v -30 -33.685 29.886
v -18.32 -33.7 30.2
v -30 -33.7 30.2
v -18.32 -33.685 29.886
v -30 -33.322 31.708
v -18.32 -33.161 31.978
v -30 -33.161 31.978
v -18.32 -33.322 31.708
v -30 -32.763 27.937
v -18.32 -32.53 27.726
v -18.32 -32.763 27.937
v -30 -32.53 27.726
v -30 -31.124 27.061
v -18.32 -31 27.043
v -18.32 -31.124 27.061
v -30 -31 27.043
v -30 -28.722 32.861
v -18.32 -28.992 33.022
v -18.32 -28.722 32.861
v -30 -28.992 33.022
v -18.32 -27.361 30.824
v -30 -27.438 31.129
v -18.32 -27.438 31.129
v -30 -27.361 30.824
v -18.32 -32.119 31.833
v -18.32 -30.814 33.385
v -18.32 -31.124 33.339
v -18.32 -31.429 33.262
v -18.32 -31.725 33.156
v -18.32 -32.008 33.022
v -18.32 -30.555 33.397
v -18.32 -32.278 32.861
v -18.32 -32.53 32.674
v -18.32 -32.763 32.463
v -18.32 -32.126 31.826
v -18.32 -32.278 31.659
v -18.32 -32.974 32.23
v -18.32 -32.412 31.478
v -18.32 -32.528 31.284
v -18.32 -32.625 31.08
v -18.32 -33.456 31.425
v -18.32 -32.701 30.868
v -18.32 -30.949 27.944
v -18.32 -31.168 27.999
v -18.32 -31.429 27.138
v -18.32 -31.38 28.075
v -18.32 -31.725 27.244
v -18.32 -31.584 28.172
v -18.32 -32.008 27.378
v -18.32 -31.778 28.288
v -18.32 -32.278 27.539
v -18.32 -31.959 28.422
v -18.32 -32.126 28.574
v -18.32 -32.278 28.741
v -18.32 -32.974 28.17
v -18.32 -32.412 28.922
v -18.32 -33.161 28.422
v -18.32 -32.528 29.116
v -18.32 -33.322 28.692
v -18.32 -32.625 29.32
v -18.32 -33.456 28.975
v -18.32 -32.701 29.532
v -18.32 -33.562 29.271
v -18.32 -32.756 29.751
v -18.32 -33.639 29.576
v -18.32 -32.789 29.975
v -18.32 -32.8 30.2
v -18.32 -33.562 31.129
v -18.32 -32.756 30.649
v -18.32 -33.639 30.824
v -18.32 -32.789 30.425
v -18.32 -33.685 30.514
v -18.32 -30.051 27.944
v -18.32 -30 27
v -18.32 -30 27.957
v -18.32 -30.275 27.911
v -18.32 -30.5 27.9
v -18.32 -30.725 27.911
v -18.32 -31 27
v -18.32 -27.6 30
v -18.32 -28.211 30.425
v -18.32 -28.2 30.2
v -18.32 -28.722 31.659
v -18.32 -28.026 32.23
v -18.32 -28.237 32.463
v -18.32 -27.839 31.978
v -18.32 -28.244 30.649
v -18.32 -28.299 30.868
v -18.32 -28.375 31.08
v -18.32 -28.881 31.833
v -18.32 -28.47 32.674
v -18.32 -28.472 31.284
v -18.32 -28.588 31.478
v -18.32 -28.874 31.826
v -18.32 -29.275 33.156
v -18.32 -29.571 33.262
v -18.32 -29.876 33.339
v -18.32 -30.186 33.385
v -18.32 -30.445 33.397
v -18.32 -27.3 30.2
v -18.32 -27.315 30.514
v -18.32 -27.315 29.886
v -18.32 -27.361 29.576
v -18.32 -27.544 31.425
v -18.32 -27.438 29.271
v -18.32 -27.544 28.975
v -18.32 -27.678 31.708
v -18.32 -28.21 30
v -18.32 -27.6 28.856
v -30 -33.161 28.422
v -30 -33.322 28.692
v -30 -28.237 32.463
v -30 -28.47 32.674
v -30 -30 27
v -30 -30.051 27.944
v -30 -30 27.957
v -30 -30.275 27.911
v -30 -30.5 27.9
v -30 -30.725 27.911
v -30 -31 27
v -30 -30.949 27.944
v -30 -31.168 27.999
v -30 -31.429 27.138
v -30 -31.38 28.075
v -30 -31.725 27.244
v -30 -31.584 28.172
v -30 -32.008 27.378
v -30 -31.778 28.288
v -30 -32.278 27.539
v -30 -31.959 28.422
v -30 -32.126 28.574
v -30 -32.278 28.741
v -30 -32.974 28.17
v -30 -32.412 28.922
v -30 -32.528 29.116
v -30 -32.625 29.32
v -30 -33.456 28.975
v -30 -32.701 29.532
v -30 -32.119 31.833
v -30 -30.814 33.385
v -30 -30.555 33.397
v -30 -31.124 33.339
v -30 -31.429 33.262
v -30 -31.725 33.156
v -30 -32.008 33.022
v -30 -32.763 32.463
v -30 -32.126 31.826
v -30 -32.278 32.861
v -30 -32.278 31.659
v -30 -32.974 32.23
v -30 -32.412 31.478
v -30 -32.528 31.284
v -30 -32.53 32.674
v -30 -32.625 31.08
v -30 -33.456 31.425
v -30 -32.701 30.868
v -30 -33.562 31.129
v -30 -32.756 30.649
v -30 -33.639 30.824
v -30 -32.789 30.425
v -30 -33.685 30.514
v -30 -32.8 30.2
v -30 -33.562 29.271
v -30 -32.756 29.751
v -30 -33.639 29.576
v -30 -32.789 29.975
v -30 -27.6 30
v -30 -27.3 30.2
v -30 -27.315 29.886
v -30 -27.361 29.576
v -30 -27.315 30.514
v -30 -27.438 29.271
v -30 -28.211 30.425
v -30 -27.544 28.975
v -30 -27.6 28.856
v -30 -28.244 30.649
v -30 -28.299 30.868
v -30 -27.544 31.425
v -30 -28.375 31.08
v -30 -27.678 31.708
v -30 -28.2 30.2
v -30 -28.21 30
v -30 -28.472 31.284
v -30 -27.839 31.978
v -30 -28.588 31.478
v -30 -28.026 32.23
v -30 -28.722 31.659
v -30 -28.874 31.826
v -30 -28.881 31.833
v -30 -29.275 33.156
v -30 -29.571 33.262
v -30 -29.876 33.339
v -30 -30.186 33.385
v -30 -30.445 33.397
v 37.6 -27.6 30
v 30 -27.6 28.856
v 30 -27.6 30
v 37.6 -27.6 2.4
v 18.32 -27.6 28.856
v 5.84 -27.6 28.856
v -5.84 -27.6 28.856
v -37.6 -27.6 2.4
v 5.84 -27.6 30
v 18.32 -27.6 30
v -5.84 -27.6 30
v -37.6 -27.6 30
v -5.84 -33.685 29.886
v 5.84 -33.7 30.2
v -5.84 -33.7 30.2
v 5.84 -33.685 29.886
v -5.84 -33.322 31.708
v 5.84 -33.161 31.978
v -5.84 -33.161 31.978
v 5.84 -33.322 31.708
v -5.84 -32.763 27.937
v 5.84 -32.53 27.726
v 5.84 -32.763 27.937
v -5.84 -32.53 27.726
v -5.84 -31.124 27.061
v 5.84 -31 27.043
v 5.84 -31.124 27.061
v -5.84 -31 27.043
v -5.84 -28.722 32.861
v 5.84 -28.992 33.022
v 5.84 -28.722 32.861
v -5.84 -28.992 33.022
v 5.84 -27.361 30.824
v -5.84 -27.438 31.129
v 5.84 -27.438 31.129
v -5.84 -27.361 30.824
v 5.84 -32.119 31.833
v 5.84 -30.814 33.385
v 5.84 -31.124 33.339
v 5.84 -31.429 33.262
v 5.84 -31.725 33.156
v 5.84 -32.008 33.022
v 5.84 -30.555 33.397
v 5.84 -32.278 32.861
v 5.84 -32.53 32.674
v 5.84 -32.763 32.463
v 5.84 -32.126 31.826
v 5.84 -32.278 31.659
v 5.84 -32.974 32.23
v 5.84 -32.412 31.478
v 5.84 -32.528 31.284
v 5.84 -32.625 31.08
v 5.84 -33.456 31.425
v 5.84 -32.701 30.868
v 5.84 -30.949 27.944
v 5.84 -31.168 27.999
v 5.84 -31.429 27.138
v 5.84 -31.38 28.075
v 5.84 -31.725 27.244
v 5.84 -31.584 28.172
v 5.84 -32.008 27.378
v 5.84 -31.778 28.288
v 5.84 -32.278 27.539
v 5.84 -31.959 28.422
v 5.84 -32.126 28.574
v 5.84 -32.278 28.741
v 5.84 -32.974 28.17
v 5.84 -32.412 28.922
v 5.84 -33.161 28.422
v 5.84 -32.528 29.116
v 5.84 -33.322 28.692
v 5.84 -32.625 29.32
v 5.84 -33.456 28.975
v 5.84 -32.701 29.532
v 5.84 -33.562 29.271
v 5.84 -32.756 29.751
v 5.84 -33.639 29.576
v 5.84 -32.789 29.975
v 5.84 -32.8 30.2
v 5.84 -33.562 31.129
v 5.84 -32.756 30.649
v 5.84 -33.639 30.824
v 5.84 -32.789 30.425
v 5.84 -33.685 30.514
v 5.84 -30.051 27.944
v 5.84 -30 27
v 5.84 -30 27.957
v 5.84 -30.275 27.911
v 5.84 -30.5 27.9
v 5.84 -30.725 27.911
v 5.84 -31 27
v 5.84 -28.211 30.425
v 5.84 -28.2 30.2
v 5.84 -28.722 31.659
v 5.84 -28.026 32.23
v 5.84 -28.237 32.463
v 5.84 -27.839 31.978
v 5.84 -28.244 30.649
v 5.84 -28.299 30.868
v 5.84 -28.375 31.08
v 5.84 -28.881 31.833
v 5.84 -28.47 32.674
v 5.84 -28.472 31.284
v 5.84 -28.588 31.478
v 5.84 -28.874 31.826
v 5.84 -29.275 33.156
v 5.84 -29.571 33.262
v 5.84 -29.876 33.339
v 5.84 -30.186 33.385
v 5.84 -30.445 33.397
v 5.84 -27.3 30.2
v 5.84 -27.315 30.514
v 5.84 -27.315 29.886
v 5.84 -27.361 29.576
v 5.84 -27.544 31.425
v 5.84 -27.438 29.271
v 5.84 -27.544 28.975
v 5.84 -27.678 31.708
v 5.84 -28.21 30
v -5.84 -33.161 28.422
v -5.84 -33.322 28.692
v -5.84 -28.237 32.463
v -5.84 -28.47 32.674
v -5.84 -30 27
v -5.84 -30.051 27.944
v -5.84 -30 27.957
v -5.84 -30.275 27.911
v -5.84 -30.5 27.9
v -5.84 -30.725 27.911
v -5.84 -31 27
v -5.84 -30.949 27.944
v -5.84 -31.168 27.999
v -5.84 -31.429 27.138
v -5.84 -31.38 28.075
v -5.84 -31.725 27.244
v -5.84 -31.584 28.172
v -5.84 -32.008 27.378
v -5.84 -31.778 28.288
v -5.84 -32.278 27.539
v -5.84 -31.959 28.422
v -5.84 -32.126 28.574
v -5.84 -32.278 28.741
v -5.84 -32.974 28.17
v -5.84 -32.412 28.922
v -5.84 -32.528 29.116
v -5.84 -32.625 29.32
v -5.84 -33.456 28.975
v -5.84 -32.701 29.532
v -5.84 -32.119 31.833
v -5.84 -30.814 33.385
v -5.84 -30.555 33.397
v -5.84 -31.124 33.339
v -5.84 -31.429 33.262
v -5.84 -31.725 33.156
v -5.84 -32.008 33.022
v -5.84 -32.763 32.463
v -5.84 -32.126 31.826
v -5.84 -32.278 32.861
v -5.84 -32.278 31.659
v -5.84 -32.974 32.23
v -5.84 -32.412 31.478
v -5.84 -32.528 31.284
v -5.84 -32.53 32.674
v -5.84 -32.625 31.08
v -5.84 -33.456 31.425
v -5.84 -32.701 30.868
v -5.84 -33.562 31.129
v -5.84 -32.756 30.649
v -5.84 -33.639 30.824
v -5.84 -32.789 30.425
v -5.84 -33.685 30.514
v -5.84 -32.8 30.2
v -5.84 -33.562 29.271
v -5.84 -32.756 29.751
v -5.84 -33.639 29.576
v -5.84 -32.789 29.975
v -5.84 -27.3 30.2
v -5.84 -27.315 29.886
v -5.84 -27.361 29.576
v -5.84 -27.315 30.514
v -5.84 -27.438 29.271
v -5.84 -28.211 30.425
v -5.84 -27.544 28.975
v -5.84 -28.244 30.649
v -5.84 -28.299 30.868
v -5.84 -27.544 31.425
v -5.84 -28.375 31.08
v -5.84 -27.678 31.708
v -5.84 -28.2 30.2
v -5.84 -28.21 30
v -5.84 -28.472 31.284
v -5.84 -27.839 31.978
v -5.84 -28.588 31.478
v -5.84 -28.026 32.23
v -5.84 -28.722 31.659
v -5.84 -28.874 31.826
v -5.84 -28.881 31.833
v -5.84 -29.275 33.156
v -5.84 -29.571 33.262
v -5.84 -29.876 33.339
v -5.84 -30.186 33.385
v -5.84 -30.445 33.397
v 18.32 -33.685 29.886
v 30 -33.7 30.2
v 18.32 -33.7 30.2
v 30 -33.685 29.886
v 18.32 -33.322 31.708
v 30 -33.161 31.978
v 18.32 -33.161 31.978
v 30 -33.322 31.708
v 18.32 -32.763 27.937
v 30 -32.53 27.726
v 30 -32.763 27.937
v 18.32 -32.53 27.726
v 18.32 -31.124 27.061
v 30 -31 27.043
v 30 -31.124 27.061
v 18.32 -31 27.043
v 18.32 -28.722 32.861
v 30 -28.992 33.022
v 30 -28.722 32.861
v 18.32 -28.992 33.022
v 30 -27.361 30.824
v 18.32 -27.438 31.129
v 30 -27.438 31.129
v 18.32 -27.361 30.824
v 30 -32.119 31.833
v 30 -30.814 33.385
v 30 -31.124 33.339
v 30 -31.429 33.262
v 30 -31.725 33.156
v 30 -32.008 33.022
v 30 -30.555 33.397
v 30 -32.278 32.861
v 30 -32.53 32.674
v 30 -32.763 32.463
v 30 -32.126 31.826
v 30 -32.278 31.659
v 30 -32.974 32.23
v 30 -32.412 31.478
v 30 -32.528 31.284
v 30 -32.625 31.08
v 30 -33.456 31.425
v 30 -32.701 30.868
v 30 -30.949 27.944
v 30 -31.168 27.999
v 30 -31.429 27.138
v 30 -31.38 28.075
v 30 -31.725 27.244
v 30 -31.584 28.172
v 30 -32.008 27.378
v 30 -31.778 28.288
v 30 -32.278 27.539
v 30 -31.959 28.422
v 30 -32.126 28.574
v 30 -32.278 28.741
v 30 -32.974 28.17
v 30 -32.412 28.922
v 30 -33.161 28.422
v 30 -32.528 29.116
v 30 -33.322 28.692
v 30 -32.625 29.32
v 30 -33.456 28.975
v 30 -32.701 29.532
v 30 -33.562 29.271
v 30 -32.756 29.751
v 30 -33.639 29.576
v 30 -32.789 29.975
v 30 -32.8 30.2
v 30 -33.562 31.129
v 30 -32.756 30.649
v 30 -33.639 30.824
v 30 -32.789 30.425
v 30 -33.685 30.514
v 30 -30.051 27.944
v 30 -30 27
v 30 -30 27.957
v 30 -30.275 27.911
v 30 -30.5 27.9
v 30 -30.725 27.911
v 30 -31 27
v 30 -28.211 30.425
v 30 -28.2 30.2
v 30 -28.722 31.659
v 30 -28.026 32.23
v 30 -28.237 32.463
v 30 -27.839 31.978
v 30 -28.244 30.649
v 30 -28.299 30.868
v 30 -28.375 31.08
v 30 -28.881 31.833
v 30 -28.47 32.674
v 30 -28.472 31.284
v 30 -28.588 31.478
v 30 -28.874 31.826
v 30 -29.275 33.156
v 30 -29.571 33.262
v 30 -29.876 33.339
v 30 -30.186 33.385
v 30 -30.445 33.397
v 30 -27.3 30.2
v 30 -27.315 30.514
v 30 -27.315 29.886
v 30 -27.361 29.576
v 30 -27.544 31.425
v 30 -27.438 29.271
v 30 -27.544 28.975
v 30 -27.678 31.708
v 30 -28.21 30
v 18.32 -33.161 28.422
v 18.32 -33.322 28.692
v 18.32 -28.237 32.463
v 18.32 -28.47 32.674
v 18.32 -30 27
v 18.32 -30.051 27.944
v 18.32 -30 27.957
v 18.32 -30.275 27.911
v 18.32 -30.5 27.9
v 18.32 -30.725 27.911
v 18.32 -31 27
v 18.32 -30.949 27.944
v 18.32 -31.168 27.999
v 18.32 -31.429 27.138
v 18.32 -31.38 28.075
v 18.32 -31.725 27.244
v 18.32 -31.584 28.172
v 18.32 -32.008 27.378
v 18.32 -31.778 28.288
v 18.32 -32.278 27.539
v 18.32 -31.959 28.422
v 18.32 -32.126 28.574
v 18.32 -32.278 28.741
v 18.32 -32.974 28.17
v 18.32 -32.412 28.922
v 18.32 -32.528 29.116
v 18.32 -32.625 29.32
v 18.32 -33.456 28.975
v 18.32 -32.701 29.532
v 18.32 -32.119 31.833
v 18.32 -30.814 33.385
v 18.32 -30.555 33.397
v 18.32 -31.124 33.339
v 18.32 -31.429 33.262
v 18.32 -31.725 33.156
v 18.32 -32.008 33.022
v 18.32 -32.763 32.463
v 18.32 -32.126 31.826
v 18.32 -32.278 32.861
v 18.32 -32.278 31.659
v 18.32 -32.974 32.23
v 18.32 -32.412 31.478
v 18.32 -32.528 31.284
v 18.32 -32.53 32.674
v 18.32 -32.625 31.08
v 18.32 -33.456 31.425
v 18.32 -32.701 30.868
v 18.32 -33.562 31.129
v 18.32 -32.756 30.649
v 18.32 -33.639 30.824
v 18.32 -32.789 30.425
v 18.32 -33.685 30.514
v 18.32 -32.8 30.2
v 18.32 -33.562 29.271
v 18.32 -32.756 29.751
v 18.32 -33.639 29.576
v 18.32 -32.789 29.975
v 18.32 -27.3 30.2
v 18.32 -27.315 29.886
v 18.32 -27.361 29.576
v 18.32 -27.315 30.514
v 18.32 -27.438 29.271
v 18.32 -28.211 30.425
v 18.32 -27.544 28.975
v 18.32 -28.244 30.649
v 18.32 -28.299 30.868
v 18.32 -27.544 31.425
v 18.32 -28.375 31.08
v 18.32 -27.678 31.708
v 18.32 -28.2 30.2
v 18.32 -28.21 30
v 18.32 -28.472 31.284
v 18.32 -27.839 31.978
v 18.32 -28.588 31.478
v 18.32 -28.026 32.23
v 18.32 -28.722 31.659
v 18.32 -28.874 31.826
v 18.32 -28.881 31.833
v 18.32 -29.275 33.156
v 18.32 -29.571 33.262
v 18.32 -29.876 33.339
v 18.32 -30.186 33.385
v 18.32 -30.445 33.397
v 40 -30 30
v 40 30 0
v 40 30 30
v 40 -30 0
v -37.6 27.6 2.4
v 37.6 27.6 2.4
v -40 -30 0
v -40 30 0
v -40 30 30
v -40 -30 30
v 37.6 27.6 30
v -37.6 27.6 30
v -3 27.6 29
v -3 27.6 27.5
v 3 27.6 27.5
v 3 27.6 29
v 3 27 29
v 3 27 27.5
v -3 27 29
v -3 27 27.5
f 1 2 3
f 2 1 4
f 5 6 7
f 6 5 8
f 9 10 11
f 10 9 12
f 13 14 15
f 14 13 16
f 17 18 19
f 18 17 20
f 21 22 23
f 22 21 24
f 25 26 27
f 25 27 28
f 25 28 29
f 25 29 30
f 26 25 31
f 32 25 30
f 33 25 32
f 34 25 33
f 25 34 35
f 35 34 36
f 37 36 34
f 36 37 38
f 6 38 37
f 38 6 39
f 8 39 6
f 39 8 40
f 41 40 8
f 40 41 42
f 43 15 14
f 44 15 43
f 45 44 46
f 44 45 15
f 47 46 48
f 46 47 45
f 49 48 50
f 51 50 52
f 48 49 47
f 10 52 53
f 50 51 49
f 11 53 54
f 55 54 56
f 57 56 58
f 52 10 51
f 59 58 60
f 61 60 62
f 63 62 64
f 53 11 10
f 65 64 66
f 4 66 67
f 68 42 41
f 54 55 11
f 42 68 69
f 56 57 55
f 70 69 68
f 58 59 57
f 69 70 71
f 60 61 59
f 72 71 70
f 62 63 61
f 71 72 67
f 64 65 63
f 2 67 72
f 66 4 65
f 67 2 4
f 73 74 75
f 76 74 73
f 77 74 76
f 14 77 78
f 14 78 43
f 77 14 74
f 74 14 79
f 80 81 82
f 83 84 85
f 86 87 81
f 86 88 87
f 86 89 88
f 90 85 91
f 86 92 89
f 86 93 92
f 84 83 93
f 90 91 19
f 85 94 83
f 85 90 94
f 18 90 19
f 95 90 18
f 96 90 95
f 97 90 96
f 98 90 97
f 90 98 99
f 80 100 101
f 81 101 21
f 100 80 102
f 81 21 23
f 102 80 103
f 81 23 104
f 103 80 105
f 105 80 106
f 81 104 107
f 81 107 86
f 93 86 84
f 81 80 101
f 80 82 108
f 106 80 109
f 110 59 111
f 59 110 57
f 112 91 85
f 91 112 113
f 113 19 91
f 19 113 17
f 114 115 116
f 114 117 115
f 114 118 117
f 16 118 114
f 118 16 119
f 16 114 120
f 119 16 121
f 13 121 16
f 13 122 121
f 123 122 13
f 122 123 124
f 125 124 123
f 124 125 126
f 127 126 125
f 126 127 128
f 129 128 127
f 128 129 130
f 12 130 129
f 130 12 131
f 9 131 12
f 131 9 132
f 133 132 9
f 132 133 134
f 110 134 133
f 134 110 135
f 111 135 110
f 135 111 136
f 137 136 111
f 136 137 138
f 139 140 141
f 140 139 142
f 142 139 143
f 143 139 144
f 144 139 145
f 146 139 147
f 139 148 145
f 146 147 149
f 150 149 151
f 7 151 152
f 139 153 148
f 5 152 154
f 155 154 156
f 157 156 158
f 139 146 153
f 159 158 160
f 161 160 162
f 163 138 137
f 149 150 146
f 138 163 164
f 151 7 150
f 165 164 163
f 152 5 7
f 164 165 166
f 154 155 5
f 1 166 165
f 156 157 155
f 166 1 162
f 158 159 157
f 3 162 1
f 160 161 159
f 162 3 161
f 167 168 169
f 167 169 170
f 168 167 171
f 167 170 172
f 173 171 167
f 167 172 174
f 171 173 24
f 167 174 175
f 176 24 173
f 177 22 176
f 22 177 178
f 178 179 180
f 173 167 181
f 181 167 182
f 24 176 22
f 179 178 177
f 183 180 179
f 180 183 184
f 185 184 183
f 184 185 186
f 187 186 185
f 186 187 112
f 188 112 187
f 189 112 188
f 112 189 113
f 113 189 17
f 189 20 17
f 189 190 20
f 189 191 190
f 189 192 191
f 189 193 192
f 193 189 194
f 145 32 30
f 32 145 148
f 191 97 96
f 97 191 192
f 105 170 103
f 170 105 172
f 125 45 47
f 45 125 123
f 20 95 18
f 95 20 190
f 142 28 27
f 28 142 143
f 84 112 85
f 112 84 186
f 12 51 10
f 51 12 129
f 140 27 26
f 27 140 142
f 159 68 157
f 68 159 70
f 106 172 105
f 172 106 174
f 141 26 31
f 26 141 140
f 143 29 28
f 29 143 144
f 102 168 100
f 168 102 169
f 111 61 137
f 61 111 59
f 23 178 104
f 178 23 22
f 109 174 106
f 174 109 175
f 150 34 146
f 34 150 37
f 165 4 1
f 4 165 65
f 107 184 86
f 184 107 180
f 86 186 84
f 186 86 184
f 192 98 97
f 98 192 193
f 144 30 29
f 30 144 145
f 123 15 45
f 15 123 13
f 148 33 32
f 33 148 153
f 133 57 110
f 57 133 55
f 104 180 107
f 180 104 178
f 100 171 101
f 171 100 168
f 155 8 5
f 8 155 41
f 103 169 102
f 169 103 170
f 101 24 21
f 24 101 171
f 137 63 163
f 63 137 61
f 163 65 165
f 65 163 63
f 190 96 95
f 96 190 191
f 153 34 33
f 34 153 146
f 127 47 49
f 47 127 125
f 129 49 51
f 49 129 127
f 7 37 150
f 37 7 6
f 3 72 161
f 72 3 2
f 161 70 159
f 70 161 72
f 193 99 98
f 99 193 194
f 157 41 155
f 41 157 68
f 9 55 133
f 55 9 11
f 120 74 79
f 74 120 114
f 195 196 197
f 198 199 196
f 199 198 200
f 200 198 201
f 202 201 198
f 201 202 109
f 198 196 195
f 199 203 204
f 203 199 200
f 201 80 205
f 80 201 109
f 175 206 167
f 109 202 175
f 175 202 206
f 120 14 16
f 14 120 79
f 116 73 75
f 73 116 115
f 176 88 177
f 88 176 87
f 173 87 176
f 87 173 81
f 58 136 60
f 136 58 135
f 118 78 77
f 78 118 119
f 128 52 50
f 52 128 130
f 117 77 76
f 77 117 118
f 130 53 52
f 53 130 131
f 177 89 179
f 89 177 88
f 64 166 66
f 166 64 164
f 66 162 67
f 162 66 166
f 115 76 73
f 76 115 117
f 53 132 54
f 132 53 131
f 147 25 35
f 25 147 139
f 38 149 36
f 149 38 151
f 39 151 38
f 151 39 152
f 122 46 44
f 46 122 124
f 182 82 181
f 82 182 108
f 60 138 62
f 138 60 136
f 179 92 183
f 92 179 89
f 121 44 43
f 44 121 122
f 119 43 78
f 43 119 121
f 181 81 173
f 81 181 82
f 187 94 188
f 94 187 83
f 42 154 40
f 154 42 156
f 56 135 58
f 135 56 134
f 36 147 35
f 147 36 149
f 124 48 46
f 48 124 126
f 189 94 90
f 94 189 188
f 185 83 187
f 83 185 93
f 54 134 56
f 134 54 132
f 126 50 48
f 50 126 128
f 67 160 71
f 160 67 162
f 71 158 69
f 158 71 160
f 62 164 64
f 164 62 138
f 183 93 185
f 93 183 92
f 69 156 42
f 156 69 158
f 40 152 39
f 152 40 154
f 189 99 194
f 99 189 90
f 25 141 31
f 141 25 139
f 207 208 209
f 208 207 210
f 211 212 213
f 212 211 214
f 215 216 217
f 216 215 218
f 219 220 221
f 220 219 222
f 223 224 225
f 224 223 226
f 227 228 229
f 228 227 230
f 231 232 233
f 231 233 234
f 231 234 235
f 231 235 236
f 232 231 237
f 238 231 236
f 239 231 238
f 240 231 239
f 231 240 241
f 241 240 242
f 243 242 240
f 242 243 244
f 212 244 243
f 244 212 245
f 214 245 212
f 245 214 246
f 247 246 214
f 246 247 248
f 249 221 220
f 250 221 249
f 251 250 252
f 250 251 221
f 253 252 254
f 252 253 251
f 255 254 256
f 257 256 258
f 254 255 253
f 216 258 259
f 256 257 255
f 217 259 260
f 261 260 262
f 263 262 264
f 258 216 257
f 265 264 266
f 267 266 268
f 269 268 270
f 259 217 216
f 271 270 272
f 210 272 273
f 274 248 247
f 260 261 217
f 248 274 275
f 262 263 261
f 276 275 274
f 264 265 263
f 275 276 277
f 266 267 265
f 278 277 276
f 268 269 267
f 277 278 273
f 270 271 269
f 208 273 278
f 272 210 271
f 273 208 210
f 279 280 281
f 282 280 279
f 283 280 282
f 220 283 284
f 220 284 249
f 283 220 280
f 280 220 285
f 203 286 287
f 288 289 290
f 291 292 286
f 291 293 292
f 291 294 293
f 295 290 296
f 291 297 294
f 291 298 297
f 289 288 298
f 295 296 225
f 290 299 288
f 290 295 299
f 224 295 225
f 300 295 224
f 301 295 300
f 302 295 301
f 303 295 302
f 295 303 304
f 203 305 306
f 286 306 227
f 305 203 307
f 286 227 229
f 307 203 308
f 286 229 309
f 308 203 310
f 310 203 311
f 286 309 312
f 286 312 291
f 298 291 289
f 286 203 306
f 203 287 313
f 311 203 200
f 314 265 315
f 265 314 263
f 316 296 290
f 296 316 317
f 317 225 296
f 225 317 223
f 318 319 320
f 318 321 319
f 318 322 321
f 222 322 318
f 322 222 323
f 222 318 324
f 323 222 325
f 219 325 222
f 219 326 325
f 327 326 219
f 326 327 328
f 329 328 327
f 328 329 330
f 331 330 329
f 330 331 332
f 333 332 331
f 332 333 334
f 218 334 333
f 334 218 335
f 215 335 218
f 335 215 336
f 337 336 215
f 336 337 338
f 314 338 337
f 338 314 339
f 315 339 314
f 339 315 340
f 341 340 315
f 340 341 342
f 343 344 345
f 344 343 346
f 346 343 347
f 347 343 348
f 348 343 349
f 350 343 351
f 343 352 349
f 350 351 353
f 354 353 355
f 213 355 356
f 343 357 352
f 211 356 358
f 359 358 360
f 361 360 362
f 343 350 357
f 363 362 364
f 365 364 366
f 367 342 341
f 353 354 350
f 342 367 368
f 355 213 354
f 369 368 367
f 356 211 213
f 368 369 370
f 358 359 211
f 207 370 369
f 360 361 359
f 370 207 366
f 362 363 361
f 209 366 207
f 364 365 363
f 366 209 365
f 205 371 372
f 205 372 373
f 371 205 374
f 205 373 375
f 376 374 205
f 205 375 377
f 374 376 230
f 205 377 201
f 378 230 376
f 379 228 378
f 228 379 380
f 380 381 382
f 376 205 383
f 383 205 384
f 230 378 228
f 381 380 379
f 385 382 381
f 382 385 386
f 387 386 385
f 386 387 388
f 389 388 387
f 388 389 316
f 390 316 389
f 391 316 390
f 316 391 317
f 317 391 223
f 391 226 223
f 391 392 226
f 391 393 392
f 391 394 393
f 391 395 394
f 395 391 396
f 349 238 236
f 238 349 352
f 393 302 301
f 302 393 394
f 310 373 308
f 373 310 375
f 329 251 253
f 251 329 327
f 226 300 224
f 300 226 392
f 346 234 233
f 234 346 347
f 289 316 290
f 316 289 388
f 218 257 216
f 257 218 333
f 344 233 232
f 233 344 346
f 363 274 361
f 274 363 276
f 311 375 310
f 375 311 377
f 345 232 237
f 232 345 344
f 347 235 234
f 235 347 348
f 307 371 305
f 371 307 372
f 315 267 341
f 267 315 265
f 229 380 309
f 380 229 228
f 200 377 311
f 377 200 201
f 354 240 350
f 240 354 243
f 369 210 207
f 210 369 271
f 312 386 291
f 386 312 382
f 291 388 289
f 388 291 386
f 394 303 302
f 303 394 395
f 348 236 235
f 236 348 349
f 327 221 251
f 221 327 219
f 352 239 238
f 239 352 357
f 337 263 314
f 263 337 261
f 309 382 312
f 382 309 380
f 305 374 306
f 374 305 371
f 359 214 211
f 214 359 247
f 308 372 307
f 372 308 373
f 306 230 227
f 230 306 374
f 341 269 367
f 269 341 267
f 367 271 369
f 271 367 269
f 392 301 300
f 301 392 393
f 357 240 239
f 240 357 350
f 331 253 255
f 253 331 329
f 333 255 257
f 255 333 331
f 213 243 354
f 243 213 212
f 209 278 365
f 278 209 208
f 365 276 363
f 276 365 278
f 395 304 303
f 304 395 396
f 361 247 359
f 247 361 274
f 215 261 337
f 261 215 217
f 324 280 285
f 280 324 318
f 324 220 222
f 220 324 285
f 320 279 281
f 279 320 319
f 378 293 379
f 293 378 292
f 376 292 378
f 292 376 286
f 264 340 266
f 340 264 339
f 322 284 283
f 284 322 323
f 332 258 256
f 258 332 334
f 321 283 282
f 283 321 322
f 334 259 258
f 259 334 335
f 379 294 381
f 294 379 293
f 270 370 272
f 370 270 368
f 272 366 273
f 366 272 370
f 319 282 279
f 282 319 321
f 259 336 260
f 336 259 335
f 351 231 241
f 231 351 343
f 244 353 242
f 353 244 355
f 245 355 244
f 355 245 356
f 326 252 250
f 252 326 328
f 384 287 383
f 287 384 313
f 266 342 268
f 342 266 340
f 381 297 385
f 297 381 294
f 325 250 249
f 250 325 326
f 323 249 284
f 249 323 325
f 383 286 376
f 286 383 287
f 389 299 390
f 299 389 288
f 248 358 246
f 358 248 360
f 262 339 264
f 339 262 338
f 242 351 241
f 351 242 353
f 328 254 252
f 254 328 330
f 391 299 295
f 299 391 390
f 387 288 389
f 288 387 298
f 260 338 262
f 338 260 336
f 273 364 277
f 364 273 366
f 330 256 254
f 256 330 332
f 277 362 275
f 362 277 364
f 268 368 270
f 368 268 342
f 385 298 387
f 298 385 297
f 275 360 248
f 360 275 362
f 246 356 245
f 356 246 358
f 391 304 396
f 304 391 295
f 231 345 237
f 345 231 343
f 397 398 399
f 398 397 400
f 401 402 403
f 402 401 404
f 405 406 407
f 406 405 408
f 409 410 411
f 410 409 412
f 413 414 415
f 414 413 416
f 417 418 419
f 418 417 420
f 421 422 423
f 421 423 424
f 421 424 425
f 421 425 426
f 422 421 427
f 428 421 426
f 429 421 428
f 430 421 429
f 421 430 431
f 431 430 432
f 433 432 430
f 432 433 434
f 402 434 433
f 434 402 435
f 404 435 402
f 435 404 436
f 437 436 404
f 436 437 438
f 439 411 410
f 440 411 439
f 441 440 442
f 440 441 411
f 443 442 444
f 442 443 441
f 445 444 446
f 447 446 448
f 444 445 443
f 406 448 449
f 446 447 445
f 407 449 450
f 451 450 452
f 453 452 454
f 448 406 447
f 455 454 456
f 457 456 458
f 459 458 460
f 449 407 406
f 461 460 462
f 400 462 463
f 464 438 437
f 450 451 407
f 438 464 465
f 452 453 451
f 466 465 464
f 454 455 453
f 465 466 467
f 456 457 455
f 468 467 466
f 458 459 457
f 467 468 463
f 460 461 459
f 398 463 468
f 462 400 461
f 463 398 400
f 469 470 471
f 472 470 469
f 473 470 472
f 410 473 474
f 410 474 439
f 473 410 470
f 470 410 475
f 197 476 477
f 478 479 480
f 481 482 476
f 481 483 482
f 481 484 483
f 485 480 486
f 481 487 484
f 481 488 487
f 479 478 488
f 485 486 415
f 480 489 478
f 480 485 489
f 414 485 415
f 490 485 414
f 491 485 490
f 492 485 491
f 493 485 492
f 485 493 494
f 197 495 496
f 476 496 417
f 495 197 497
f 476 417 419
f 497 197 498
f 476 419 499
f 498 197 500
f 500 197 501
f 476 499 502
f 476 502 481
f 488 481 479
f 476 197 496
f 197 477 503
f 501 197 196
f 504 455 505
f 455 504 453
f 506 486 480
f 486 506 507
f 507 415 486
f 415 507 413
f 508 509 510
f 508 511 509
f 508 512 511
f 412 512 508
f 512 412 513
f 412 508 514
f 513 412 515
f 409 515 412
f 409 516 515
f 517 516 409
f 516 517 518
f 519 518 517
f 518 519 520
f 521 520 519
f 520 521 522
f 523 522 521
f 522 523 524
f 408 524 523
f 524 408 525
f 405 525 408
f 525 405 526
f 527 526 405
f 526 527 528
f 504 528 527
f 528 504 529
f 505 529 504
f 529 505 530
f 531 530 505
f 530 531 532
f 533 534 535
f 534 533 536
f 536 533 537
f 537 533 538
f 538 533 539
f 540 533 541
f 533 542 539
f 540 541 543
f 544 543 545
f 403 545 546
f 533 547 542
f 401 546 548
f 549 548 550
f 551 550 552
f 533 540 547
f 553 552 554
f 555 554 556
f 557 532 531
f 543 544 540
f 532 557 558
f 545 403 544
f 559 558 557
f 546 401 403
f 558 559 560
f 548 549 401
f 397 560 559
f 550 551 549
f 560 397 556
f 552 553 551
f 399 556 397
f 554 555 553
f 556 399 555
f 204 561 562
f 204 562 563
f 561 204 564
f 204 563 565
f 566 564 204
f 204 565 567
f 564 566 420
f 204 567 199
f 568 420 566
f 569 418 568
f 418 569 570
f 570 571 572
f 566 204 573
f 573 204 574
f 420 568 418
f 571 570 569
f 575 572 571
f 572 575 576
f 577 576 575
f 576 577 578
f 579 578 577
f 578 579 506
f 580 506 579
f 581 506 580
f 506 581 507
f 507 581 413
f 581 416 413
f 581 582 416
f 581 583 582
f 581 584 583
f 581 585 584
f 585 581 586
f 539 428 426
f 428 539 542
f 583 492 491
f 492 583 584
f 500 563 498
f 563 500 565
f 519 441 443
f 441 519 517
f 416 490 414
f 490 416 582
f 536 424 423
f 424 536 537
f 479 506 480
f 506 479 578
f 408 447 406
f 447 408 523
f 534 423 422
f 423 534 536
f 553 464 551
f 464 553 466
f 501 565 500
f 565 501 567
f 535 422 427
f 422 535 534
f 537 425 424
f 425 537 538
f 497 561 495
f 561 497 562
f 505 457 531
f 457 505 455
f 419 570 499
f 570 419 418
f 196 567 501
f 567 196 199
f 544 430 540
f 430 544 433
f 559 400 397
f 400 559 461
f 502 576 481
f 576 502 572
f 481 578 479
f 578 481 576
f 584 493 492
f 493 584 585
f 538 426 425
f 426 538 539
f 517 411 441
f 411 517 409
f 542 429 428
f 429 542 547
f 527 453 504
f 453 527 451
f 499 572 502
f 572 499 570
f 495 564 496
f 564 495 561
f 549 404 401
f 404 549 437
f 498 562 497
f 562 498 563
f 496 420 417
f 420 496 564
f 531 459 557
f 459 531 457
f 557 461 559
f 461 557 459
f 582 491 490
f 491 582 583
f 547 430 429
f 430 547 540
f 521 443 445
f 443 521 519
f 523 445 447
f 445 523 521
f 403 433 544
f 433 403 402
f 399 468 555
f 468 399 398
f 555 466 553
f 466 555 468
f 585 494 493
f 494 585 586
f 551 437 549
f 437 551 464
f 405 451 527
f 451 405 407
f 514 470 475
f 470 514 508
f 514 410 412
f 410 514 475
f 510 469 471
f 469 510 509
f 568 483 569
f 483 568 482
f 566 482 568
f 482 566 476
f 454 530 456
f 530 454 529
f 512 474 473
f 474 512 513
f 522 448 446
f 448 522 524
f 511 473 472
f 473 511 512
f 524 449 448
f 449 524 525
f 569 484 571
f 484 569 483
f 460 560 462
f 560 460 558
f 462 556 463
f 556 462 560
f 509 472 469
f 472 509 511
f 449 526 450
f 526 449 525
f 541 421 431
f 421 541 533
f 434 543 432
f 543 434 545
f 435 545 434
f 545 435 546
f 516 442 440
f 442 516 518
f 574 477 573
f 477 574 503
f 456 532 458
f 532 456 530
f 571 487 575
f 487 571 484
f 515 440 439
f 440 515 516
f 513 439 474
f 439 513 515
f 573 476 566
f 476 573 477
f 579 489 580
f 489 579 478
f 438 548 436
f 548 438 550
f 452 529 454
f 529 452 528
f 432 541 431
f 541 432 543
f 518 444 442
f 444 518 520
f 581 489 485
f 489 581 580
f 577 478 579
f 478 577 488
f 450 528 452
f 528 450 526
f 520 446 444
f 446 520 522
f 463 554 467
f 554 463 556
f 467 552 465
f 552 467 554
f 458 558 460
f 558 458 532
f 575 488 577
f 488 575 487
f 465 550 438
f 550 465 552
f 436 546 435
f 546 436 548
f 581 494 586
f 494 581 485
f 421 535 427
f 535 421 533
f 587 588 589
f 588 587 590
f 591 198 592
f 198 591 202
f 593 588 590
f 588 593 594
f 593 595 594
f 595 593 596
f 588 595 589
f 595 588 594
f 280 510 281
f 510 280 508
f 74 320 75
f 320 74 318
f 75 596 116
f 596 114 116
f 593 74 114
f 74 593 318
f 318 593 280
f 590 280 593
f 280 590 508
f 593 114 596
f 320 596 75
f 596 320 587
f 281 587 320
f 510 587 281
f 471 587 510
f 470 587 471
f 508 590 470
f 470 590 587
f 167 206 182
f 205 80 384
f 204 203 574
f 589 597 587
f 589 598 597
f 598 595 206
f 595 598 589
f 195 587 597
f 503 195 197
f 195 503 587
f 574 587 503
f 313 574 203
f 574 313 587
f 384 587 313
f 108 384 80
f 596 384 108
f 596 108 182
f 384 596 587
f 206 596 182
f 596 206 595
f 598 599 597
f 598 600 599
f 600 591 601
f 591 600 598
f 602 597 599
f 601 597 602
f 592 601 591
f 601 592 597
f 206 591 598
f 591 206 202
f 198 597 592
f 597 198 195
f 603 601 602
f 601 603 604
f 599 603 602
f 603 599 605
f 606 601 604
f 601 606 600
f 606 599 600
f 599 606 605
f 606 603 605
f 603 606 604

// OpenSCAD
// Box with print-in-place hinge
// [box, lid, pin, assembly]
part = "box";
cadverify_only = "";
module instance(name, part, unit = 1) {
    echo(cadverify_instance = [name, part, unit]);
    if (cadverify_only == "" || cadverify_only == name) children();
}

// Parameters (mm)
W = 80; D = 60; Hbox = 30; Hlid = 10;
t_wall = 2.4; t_floor = 2.4; t_top = 2.4;
gap_v = 0.4;              // vertical lid/box gap
clr_r = 0.3;              // radial pin/bore clearance
clr_a = 0.4;              // axial knuckle gap
Rkn = 3.2; rbore = 2.3; rpin = 2.0;
yh = -30.5;               // hinge axis Y (assembly coords, box centered X0 Y0)
zh_box = 30.2;            // hinge axis Z in box coords (= assembly)
lip_h = 3.0;              // plug depth below lid skirt bottom
plug_t = 2.0;             // plug wall thickness
// hinge segmentation: span -30..30, 5 knuckles len 11.68 gaps 0.4
k_len = 11.68;
k0x0=-30; k0x1=-18.32;
k1x0=-17.92; k1x1=-6.24;
k2x0=-5.84; k2x1=5.84;
k3x0=6.24; k3x1=17.92;
k4x0=18.32; k4x1=30;
// lid part coords: plug bottom Z0, skirt bottom Z3, top Z13
lid_zh = 2.8;             // hinge axis Z in lid part coords (30.2-27.4)
lid_lift = 27.4;          // translate lid part to assembly
pin_lift_z = 27.2; pin_shift_y = -30.5;

$fn = 64;

module teardrop_prism(x0,x1,yh,zh) {
    ya = yh-1.626; za = zh+1.626;
    yb = yh+1.626; zb = zh+1.626;
    yc = yh;       zc = zh+3.252;
    polyhedron(
        points=[[x0,ya,za],[x0,yb,zb],[x0,yc,zc],
                [x1,ya,za],[x1,yb,zb],[x1,yc,zc]],
        faces=[[0,2,1],[3,4,5],[0,1,4,3],[1,2,5,4],[0,3,5,2]]
    );
}

module knuckle_solid(x0,x1,yh,zh) {
    // outer cylinder along X
    translate([x0,yh,zh]) rotate([0,90,0]) cylinder(r=Rkn, h=x1-x0);
}

module knuckle_bore(x0,x1,yh,zh) {
    translate([x0-0.02,yh,zh]) rotate([0,90,0]) cylinder(r=rbore, h=(x1-x0)+0.04);
    teardrop_prism(x0-0.02,x1+0.02,yh,zh);
}

module box_knuckle(x0,x1) {
    difference() {
        union() {
            knuckle_solid(x0,x1,yh,zh_box);
            // lug to back wall: X x0..x1, Y -31..-27.6, Z 27..30.5
            translate([x0,-31,27]) cube([x1-x0, 3.4, 3.5]);
        }
        knuckle_bore(x0,x1,yh,zh_box);
    }
}

module lid_knuckle(x0,x1) {
    difference() {
        union() {
            knuckle_solid(x0,x1,yh,lid_zh);
            // lug to lid back: Y -31..-27.6, Z 1.5..4.5 (part coords)
            translate([x0,-31,1.5]) cube([x1-x0, 3.4, 3.0]);
        }
        knuckle_bore(x0,x1,yh,lid_zh);
    }
}

module box_part() {
    difference() {
        union() {
            // floor
            translate([-40,-30,0]) cube([80,60,t_floor]);
            // front wall
            translate([-40,27.6,t_floor]) cube([80,2.4,Hbox-t_floor]);
            // back wall
            translate([-40,-30,t_floor]) cube([80,2.4,Hbox-t_floor]);
            // left wall
            translate([-40,-27.6,t_floor]) cube([2.4,55.2,Hbox-t_floor]);
            // right wall
            translate([37.6,-27.6,t_floor]) cube([2.4,55.2,Hbox-t_floor]);
            // catch bump front inner: 6 x 0.6 x 1.5 at Z27.5..29
            translate([-3,27.0,27.5]) cube([6,0.6,1.5]);
            // knuckles
            box_knuckle(k0x0,k0x1);
            box_knuckle(k2x0,k2x1);
            box_knuckle(k4x0,k4x1);
        }
        // hollow interior already via walls? floor+walls leave interior void; no extra cut needed
        // (walls built as separate boxes, interior is void)
        dummy=0;
    }
}

module lid_part() {
    // lid part coords: plug bottom 0, skirt bottom 3, top 13
    difference() {
        union() {
            // top plate 80x60x2.4 at Z10.6..13
            translate([-40,-30,10.6]) cube([80,60,2.4]);
            // outer skirt walls Z3..10.6 (h7.6)
            // front
            translate([-40,27.6,3]) cube([80,2.4,7.6]);
            // back
            translate([-40,-30,3]) cube([80,2.4,7.6]);
            // left
            translate([-40,-27.6,3]) cube([2.4,55.2,7.6]);
            // right
            translate([37.6,-27.6,3]) cube([2.4,55.2,7.6]);
            // inner plug walls Z0..10.6 outer 74.4x54.4 t=2.0
            // front plug
            translate([-37.2,25.2,0]) cube([74.4,2.0,10.6]);
            // back plug
            translate([-37.2,-27.2,0]) cube([74.4,2.0,10.6]);
            // left plug
            translate([-37.2,-25.2,0]) cube([2.0,50.4,10.6]);
            // right plug
            translate([35.2,-25.2,0]) cube([2.0,50.4,10.6]);
            // lid knuckles
            lid_knuckle(k1x0,k1x1);
            lid_knuckle(k3x0,k3x1);
        }
        // catch notch in front plug: open at bottom Z0..1.8, X-3.2..3.2, Y26.4..27.2+0.05
        translate([-3.2,26.4,0-0.05]) cube([6.4,0.85,1.85]);
    }
}

module pin_part() {
    union() {
        // shaft r2 from -32.4..32.4 along X at Y0 Z3
        translate([-32.4,0,3]) rotate([0,90,0]) cylinder(r=rpin, h=64.8);
        // heads r3 thickness 2 at ends: inner 30.4 outer 32.4
        translate([30.4,0,3]) rotate([0,90,0]) cylinder(r=3, h=2);
        translate([-32.4,0,3]) rotate([0,90,0]) cylinder(r=3, h=2);
    }
}

// ---- specs ----
if (part=="box") {
    echo(cadverify_spec = [
        ["bounds", [[-40,-33.7,0],[40,30,33.4]]],
        ["bodies", 1],
        ["through_holes", 3],
        ["support_faces", [["bed","-z",4000]]],
        ["overhangs_allowed", [["hinge knuckles underside, prints bridged over bore gap", [[-30,-34,26],[30,-27,31]]]]],
        ["copies", 1],
        ["details", [
            ["floor","thickness",[0,0,-1],[0,0,1],2.4],
            ["front_wall","thickness",[0,31,15],[0,-1,0],2.4],
            ["cavity","void",[[-37.6,-27.6,2.4],[37.6,27.6,29.9]],0.9],
            ["hinge_bore","hole",[-31,-30.5,30.2],[1,0,0],[[0,4.6],[11.6,4.6]]],
            ["catch_bump","material",[[-3,27.0,27.5],[3,27.6,29.0]],0.9],
            ["hinge_view","view",[[-30,-34,26],[30,-27,34]]]
        ]]
    ]);
    box_part();
} else if (part=="lid") {
    echo(cadverify_spec = [
        ["bounds", [[-40,-33.7,0],[40,30,13]]],
        ["bodies", 1],
        ["through_holes", 2],
        ["support_faces", [["bed","-z",300]]],
        ["overhangs_allowed", [
            ["hinge knuckles underside", [[-18,-34,0],[18,-27,4]]],
            ["lid top bridging over cavity", [[-37.6,-27.6,9],[37.6,27.6,11]]]
        ]],
        ["copies", 1],
        ["details", [
            ["top","thickness",[0,0,14],[0,0,-1],2.4],
            ["skirt","thickness",[0,31,6],[0,-1,0],2.4],
            ["plug_cavity","void",[[-35.2,-25.2,0],[35.2,25.2,10.5]],0.9],
            ["hinge_bore","hole",[-18.6,-30.5,2.8],[1,0,0],[[0,4.6],[11.6,4.6]]],
            ["catch_notch","void",[[-3.2,26.4,0],[3.2,27.25,1.8]],0.9],
            ["catch_view","view",[[-5,25,0],[5,28.5,3]]]
        ]]
    ]);
    lid_part();
} else if (part=="pin") {
    echo(cadverify_spec = [
        ["bounds", [[-32.4,-3,0],[32.4,3,6]]],
        ["bodies", 1],
        ["support_faces", []],
        ["overhangs_allowed", [["pin underside bridging, small radius breaks free", [[-32.4,-3,0],[32.4,3,2]]]]],
        ["copies", 1],
        ["details", [
            ["shaft","thickness",[0,3,3],[0,-1,0],4.0],
            ["head","material",[[30.4,-3,0],[32.4,3,6]],0.7],
            ["pin_view","view",[[-32.4,-3,0],[32.4,3,6]]]
        ]]
    ]);
    pin_part();
} else if (part=="assembly") {
    echo(cadverify_spec = [
        ["bounds", [[-40,-33.7,0],[40,30,40.4]]],
        ["support_faces", [["bed","-z",4000]]],
        ["allowed_interferences", []],
        ["motions", [
            ["lid_open", ["lid"], "rotate", [0,-30.5,30.2], [1,0,0], [0,110]]
        ]],
        ["assembly_order", [
            [["box"], [0,0,0]],
            [["lid"], [0,0,1]],
            [["pin"], [1,0,0]]
        ]],
        ["print_in_place", 0.3],
        ["overhangs_allowed", [
            ["hinge undersides in place", [[-30,-34,26],[30,-26,34]]],
            ["lid bridging over box cavity", [[-37.6,-27.6,29.5],[37.6,27.6,31]]]
        ]]
    ]);
    instance("box","box") box_part();
    instance("lid","lid") translate([0,0,lid_lift]) lid_part();
    instance("pin","pin") translate([0,pin_shift_y,pin_lift_z]) pin_part();
}
